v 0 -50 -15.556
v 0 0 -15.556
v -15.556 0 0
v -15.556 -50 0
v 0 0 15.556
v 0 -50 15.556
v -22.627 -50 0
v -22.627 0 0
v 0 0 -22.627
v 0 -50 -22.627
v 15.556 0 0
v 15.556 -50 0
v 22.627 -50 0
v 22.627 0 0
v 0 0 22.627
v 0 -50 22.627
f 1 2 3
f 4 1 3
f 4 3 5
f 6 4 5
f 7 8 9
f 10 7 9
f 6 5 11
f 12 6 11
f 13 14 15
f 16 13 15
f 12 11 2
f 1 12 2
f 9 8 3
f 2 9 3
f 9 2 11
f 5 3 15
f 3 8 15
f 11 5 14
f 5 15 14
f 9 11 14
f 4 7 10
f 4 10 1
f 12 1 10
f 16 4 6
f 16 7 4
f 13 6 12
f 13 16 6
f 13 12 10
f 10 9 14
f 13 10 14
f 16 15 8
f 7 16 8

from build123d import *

# Parameters (mm, degrees)
F1_DEPTH = 50


with BuildPart() as f1:
    # F0 (on Front) → F1 (new body)
    with BuildSketch(Plane.XZ):
        Polygon((0, 22.627417), (-22.627417, 0), (0, -22.627417), (22.627417, 0), align=None)
        Polygon((-15.556349, 0), (0, 15.556349), (15.556349, 0), (0, -15.556349), align=None, mode=Mode.SUBTRACT)
    extrude(amount=F1_DEPTH)


solid = f1.part
